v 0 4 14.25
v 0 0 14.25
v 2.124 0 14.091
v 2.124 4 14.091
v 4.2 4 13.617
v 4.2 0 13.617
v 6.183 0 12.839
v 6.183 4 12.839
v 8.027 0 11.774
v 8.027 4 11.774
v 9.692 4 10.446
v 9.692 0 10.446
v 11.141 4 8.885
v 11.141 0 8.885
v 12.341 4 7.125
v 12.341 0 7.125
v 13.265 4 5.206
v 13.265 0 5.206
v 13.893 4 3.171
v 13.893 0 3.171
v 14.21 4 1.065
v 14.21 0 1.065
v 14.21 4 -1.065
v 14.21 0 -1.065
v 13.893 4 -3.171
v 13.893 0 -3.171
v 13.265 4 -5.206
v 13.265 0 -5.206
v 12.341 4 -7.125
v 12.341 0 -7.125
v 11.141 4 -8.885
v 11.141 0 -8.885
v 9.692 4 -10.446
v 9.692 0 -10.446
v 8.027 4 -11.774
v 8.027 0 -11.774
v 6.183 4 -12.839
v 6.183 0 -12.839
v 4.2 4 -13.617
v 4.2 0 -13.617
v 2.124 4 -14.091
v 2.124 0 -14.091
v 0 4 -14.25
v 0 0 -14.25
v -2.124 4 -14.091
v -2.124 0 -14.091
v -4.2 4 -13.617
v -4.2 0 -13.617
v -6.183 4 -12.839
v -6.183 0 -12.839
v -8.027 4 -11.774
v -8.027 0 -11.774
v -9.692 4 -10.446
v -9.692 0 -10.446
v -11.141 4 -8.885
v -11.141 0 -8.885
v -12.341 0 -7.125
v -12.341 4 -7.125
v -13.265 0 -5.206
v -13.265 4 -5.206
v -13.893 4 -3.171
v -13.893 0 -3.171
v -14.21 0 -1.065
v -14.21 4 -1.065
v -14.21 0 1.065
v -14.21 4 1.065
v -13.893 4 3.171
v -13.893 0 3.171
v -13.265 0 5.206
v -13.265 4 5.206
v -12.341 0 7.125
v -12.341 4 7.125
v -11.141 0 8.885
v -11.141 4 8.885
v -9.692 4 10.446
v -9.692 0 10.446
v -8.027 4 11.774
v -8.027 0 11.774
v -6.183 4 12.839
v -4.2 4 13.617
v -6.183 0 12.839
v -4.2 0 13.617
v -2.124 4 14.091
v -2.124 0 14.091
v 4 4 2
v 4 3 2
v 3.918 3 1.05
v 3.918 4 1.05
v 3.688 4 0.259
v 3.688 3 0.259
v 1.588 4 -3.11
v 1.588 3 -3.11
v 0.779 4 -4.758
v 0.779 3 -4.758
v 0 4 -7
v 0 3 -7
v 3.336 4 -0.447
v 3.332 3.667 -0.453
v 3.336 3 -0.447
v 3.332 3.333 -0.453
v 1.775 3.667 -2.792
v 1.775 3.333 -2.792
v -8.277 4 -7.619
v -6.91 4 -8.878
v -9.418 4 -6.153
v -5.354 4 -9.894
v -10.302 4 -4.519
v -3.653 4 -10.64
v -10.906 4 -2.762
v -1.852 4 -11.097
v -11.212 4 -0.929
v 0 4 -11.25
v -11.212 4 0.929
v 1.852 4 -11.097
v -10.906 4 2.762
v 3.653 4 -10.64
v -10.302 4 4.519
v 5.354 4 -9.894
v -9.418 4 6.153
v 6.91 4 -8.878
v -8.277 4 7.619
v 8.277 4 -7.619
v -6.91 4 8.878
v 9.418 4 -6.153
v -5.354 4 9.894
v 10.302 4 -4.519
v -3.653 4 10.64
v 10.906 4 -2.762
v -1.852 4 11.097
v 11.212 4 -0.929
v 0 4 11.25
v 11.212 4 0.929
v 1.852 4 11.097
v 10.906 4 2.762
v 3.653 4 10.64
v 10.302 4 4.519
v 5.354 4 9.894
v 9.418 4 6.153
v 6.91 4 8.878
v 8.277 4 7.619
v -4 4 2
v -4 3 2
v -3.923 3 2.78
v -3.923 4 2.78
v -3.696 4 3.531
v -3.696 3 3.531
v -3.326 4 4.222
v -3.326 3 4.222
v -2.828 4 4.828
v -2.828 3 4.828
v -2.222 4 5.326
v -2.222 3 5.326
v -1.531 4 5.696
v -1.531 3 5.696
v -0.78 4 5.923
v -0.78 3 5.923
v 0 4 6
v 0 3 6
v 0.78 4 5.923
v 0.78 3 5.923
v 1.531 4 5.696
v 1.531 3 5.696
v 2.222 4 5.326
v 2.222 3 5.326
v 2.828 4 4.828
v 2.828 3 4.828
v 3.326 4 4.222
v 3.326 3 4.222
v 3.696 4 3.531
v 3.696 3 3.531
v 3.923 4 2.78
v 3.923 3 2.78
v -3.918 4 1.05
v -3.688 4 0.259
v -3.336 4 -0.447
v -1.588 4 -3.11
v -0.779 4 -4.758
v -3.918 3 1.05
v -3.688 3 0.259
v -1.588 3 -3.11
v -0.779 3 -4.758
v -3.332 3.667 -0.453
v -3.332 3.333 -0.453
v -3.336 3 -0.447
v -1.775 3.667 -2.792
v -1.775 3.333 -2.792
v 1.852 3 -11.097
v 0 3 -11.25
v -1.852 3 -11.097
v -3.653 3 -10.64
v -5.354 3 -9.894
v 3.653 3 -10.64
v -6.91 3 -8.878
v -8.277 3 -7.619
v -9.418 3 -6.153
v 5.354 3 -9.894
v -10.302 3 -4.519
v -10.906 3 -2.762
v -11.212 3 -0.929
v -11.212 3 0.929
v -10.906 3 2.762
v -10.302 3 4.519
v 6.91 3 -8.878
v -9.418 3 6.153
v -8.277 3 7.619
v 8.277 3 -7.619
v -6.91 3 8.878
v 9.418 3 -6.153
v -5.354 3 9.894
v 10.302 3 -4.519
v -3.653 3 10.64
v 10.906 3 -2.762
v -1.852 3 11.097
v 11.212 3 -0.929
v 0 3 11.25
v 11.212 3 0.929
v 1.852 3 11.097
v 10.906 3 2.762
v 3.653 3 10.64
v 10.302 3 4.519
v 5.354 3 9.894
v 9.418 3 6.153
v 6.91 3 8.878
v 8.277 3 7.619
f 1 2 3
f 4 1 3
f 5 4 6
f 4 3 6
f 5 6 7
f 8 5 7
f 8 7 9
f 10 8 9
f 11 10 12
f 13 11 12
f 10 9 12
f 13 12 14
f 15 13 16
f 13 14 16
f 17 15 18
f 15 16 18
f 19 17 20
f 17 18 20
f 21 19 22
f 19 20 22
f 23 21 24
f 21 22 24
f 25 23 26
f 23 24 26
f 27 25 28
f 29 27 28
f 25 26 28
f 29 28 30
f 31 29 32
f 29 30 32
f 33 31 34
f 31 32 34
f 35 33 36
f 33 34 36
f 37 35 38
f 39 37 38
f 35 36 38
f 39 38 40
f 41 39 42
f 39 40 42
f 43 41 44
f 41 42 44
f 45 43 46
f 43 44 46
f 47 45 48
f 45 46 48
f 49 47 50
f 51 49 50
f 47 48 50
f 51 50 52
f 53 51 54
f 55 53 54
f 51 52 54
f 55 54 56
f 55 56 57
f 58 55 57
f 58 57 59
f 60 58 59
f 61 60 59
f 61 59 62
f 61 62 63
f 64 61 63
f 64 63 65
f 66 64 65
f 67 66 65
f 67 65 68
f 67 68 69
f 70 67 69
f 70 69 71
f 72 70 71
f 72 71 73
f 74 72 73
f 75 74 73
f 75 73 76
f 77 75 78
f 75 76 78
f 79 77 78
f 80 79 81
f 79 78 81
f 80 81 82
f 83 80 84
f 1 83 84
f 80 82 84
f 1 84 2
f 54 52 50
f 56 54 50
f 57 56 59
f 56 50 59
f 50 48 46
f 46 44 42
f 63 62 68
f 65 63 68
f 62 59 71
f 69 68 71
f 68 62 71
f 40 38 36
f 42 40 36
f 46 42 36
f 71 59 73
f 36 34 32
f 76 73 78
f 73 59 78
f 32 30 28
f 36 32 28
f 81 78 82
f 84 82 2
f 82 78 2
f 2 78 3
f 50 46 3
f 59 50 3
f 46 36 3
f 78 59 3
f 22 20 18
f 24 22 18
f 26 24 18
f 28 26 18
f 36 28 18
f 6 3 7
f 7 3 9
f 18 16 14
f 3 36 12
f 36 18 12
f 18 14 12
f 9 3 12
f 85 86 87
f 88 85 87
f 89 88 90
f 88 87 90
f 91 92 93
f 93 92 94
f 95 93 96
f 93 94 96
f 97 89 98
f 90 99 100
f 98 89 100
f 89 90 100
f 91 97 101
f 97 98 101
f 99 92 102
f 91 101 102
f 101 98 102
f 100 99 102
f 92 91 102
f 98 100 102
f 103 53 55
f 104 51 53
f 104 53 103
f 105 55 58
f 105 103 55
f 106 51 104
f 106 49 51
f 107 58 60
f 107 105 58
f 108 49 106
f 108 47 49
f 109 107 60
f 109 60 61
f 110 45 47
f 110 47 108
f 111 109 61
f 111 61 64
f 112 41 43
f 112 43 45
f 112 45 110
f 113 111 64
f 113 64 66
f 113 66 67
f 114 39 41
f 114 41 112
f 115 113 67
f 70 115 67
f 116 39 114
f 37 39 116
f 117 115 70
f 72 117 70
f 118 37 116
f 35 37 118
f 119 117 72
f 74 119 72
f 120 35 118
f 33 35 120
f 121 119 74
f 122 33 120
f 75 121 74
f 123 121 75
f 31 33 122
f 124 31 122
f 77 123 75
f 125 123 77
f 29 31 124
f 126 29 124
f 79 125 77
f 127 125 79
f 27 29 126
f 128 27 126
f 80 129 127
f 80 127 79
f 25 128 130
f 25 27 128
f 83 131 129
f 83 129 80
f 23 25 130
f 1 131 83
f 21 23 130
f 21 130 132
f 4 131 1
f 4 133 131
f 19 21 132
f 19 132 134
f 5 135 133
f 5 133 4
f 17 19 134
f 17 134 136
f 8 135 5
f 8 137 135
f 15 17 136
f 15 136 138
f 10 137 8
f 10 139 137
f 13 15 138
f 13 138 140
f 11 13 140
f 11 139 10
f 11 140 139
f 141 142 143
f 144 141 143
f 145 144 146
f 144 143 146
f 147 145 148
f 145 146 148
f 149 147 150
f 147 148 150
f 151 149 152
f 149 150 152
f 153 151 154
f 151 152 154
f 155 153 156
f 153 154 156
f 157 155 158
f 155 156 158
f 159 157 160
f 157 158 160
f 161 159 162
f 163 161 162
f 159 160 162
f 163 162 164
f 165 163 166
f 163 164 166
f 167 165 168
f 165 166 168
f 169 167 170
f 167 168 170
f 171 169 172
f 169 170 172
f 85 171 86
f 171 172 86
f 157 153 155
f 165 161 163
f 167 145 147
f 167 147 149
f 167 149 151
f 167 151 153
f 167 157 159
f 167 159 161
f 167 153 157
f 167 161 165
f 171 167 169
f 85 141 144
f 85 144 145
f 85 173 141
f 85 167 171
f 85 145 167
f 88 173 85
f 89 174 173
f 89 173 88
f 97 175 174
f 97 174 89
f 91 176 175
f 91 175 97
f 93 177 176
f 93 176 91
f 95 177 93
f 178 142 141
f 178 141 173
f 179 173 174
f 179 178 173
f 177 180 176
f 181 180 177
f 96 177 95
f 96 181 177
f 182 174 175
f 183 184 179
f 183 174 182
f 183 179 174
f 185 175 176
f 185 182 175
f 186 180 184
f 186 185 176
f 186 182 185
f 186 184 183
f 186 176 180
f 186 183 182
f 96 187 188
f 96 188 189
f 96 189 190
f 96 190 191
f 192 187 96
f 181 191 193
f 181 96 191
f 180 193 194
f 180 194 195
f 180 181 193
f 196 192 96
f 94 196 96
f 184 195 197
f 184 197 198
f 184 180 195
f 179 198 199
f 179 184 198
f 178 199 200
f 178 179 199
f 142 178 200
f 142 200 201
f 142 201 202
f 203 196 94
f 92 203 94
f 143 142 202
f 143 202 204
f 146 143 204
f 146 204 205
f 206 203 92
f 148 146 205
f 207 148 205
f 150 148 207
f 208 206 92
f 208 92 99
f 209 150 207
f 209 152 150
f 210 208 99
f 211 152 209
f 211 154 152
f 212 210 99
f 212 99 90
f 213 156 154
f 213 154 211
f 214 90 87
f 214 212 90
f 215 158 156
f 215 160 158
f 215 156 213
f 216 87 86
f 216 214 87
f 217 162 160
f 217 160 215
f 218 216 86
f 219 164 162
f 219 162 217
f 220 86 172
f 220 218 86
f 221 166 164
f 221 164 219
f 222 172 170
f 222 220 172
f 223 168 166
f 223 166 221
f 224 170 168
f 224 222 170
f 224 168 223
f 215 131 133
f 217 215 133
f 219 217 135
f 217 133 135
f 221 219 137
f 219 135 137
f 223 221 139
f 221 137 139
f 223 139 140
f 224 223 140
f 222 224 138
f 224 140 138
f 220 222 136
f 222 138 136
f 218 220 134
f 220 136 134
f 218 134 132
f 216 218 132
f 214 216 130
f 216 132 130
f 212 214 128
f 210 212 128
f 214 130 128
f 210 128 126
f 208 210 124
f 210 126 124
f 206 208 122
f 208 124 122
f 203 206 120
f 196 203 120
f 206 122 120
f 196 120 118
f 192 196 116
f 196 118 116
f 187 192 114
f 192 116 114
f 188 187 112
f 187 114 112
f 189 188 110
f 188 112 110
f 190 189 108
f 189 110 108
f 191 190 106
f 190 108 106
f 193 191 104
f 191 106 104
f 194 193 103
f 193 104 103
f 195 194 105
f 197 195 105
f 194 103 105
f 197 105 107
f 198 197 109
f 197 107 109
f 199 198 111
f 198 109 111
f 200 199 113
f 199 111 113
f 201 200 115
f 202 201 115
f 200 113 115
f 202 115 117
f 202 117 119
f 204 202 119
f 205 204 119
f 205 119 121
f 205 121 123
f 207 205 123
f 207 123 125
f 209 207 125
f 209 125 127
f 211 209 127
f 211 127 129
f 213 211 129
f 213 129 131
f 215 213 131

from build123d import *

# Parameters (mm, degrees)
SKETCH_1_R          = 14.25
EXTRUDE_1_DEPTH     = 4
SKETCH_2_R          = 11.25
CUT_EXTRUDE_1_DEPTH = 1
EXTRUDE_2_DEPTH     = 1


with BuildPart() as part:
    # 草图1 → 凸台-拉伸1 (new body)
    with BuildSketch(Plane(origin=(0, 0, 0), x_dir=(1, 0, 0), z_dir=(0, 1, 0))):
        with Locations(Location((0, 0, 0), (0, 0, 270))):
            Circle(SKETCH_1_R)
    extrude(amount=EXTRUDE_1_DEPTH)

    # 草图2 → 切除-拉伸1 (cut)
    with BuildSketch(Plane(origin=(0, 4, 0), x_dir=(1, 0, 0), z_dir=(0, 1, 0))):
        with Locations(Location((0, 0, 0), (0, 0, 270))):
            Circle(SKETCH_2_R)
    extrude(amount=-CUT_EXTRUDE_1_DEPTH, mode=Mode.SUBTRACT)

    # 草图3 → 凸台-拉伸2 (add)
    with BuildSketch(Plane(origin=(0, 3, 0), x_dir=(1, 0, 0), z_dir=(0, 1, 0))):
        with BuildLine():
            ThreePointArc((-4, -2), (0, -6), (4, -2))
            add(Edge.make_bspline(
                [(4, -2), (4, 1.17143168), (1.660537063, 1.196977672), (0, 7)],
                knots=[0, 0, 0, 0, 1, 1, 1, 1], degree=3))
            add(Edge.make_bspline(
                [(-4, -2), (-4, 1.17143168), (-1.660537063, 1.196977672), (0, 7)],
                knots=[0, 0, 0, 0, 1, 1, 1, 1], degree=3))
        make_face()
    extrude(amount=EXTRUDE_2_DEPTH)


solid = part.part
